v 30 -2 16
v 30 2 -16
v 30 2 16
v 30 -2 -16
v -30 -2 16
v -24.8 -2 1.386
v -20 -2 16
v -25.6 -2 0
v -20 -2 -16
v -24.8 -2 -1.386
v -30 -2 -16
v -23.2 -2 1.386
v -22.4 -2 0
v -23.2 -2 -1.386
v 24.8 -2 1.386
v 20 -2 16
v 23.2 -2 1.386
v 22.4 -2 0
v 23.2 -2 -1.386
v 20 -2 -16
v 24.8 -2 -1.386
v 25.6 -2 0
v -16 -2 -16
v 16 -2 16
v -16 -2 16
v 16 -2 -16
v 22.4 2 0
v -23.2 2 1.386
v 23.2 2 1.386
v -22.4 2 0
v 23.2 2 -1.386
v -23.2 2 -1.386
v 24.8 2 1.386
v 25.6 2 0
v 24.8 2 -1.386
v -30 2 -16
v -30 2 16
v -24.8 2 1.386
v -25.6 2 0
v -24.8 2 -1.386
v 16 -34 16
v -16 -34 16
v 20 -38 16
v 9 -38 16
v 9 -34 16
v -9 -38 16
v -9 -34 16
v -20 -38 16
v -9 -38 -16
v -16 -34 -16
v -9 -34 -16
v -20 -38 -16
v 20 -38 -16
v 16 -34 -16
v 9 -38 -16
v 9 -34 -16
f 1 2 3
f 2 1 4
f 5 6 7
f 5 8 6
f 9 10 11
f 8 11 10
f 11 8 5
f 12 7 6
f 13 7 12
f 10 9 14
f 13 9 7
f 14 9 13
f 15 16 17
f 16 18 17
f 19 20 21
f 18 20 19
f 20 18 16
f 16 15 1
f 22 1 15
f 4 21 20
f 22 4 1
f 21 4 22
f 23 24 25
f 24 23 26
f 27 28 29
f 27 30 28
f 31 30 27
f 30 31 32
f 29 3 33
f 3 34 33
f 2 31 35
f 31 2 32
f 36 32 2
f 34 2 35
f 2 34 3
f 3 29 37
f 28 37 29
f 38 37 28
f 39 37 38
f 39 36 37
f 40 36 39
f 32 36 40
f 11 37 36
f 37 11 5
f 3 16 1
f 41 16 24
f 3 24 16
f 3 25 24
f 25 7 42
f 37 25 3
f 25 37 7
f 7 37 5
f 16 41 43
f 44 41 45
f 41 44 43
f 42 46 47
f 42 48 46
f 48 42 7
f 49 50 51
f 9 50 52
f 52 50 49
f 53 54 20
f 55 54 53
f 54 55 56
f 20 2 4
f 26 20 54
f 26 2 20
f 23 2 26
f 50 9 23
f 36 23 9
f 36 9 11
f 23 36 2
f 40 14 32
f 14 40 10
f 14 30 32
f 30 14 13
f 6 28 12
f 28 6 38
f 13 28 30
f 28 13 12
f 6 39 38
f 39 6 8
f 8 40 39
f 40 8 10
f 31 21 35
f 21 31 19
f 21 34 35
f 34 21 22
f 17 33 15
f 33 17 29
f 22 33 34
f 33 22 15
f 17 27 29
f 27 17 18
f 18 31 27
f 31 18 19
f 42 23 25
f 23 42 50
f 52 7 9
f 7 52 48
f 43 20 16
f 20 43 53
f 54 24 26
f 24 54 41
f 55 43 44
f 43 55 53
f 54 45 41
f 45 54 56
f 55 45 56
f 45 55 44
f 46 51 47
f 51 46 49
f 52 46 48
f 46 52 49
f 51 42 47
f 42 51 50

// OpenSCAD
thickness=4;
width=32;
length=32+thickness;
height=32+thickness;
holder=length/3;
overhangs=7;
dia=3.2;

module h() 
{
difference() {
	/* base */
	cube([length+holder*2,width,thickness],center=true);
	translate([-length/2-holder/2,0,0]) cylinder(thickness*2,dia/2,dia/2,center=true);
	translate([length/2+holder/2,0,0]) cylinder(thickness*2,dia/2,dia/2,center=true);
}
/* walls */
translate([-length/2,0,height/2]) cube([thickness,width,height],center=true);
translate([length/2,0,height/2]) cube([thickness,width,height],center=true);
/* overhangs */
translate([length/2-overhangs/2,0,height])   cube([overhangs+thickness,width,thickness],center=true);
translate([-length/2+overhangs/2,0,height])   cube([overhangs+thickness,width,thickness],center=true);
}

rotate([90,0,0]) h();
